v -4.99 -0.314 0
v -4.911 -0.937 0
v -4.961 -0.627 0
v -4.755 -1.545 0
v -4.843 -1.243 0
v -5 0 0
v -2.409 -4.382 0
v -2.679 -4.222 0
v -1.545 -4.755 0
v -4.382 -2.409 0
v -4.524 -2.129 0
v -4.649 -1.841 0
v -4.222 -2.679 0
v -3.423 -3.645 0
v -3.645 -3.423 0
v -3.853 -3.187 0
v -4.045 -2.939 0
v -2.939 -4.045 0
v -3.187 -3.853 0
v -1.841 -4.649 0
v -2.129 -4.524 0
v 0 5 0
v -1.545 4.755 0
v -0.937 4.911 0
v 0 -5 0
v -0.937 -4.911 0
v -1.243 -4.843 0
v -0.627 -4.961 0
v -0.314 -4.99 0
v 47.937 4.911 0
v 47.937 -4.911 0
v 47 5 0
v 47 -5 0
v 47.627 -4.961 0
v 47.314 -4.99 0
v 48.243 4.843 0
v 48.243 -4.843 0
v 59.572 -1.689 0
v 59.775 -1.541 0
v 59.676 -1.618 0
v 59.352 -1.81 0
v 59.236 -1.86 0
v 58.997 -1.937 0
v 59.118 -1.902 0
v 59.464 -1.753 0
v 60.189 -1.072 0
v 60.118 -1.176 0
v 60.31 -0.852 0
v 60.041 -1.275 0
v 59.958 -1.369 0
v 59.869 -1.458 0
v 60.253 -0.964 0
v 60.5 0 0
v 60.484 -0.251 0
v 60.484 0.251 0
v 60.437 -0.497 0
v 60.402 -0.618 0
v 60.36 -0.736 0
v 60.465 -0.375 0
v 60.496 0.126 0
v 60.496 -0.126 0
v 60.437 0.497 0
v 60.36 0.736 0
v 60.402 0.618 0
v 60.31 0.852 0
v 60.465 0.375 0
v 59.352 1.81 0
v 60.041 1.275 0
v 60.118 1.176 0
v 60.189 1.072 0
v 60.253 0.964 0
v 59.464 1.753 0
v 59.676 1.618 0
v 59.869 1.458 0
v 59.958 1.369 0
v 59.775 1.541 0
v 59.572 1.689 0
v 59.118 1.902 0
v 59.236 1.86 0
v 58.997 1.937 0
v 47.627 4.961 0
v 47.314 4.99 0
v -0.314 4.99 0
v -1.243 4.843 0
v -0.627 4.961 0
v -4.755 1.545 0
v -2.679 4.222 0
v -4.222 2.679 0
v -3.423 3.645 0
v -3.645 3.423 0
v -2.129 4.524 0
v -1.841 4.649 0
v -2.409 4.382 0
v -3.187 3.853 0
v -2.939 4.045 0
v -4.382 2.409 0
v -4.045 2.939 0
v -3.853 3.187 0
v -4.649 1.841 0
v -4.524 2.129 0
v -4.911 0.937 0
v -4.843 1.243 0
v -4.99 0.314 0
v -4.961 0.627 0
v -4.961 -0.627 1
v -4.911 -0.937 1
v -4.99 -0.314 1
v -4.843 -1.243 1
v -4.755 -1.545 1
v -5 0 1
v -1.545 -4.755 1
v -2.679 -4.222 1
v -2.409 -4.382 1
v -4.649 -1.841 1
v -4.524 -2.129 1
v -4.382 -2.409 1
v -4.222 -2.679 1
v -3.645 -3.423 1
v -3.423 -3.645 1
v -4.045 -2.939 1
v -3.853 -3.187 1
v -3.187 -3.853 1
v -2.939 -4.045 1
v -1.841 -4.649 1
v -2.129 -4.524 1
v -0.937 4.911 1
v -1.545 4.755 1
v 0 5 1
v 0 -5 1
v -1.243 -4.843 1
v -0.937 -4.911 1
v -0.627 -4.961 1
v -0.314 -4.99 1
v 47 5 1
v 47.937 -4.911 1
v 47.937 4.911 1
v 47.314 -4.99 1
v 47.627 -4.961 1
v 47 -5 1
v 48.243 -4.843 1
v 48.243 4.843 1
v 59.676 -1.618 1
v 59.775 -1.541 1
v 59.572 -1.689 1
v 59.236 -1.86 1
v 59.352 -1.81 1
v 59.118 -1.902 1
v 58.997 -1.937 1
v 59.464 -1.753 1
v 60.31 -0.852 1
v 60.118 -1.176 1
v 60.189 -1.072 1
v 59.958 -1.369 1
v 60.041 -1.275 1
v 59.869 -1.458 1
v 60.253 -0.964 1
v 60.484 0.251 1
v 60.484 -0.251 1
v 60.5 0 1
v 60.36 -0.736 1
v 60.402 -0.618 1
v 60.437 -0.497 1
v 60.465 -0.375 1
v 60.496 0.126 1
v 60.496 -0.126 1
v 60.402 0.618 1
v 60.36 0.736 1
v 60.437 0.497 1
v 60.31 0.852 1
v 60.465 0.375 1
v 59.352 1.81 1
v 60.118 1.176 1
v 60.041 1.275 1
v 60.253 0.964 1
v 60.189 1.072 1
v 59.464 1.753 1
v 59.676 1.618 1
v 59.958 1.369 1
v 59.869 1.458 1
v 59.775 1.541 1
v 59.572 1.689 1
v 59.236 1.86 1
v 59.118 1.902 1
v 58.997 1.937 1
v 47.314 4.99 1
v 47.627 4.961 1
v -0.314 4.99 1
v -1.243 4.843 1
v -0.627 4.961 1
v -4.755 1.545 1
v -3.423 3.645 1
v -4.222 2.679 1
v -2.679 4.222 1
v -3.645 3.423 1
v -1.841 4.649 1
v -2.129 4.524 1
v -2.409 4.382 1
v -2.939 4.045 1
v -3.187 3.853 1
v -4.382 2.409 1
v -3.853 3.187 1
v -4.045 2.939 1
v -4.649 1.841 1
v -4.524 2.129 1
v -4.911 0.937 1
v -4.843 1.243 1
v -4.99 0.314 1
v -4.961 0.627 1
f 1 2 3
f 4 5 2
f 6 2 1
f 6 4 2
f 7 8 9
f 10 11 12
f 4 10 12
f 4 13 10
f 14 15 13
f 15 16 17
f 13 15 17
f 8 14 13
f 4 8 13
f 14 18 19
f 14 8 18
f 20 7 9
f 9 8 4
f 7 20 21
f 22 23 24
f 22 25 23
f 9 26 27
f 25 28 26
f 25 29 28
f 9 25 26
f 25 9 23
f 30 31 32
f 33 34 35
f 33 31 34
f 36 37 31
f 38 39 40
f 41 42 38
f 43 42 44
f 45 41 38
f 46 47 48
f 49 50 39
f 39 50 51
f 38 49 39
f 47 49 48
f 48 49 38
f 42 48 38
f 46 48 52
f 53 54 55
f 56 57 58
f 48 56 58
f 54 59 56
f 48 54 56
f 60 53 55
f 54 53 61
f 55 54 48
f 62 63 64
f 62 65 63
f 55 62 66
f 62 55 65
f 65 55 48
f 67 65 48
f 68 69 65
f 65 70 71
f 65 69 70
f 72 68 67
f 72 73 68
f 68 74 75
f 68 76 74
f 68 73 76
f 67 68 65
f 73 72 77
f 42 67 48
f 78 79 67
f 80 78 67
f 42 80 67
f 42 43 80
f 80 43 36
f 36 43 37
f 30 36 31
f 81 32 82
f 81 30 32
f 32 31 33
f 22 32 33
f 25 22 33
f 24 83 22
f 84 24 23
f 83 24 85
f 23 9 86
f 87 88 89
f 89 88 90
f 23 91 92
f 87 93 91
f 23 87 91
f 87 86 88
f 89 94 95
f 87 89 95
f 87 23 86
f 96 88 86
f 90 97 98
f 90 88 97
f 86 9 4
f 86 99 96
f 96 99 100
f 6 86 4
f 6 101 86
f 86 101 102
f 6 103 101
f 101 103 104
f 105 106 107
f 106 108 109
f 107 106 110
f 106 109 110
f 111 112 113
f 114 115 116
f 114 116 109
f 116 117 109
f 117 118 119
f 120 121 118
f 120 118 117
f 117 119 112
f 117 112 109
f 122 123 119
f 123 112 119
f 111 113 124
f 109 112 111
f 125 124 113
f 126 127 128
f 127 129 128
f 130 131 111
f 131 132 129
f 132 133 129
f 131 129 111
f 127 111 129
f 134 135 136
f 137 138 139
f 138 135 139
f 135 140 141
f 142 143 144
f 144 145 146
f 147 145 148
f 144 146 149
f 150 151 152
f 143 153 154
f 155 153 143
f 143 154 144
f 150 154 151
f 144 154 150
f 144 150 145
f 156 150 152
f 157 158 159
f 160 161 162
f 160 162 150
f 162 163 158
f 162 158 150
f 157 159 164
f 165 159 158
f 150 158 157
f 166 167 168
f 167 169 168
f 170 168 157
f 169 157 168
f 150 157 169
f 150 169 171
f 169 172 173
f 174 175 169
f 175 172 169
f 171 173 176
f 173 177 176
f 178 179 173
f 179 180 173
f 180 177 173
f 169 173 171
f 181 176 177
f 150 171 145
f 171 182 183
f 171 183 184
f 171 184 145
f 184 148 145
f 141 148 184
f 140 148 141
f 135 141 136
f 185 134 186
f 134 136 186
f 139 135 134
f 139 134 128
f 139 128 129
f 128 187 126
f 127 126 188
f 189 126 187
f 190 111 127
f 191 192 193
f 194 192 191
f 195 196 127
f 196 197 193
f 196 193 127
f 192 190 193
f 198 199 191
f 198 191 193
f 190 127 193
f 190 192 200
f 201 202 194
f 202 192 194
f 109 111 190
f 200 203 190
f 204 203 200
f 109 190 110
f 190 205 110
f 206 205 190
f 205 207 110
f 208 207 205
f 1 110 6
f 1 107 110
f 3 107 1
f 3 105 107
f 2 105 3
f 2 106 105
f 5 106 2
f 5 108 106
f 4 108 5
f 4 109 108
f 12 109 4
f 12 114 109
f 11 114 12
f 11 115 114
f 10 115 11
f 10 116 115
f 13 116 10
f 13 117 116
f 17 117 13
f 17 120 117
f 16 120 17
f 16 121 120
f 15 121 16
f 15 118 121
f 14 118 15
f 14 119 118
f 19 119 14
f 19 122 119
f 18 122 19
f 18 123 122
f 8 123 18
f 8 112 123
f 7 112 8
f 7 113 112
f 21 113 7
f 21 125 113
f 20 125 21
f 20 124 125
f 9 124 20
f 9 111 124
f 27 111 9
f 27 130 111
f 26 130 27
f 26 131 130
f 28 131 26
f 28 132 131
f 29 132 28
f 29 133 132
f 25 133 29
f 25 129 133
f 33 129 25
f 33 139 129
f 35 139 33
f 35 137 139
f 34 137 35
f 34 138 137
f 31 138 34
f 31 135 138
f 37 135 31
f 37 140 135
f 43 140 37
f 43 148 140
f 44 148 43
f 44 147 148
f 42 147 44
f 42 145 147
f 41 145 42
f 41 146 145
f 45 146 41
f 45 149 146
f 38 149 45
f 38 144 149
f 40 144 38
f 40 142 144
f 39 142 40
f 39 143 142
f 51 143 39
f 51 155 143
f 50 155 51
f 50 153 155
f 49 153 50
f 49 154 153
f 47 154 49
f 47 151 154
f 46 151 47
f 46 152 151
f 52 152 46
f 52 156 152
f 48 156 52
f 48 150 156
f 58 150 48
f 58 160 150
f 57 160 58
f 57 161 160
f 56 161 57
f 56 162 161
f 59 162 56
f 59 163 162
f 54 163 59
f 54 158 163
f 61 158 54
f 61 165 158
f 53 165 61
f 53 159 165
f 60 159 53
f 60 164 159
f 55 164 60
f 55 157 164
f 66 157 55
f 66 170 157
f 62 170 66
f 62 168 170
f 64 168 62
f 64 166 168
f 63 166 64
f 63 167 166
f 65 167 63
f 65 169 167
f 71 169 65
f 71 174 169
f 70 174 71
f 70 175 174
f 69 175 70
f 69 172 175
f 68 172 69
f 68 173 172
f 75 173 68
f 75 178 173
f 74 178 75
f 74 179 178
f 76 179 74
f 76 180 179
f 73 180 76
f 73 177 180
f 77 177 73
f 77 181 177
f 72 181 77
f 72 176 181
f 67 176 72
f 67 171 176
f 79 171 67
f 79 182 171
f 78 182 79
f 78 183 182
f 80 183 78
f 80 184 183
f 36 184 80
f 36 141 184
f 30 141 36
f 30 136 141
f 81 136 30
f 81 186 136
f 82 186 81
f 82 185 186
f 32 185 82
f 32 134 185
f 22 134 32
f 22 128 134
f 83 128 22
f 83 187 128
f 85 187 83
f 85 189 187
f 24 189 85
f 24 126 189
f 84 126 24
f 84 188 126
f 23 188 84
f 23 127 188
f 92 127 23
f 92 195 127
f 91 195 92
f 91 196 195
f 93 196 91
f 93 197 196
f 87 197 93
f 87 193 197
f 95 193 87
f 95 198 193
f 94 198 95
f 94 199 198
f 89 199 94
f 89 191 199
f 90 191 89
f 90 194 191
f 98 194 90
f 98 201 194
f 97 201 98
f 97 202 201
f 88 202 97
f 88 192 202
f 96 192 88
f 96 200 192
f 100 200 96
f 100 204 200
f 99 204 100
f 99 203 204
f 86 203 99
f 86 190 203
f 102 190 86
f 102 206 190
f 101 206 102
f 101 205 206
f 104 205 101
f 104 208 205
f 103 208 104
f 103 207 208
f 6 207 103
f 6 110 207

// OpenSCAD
$fn=100;


textstring = "@MattPLees";
textsize = 5;
collarheight = 1;
 

module collar(cheight=1) {
    linear_extrude(height = cheight) {
        hull() {
            hull() {
                circle(5);
                translate([47,0,0]) circle(5);
            }
            translate([58.5,0,0]) circle(2);
        }
    }
}


module embedtext(textstring = "", cheight=1, tsize = 7) {
    color("Red") {
        translate([5,-(tsize/2), cheight-0.25]) {
            linear_extrude(10) {
                text(textstring, font = "Liberation Sans", size = tsize, direction = "ltr", spacing = 1);
            }
        }
    }
}
 

difference() {
    collar(collarheight);
    //embedtext(textstring, collarheight, textsize);
}
